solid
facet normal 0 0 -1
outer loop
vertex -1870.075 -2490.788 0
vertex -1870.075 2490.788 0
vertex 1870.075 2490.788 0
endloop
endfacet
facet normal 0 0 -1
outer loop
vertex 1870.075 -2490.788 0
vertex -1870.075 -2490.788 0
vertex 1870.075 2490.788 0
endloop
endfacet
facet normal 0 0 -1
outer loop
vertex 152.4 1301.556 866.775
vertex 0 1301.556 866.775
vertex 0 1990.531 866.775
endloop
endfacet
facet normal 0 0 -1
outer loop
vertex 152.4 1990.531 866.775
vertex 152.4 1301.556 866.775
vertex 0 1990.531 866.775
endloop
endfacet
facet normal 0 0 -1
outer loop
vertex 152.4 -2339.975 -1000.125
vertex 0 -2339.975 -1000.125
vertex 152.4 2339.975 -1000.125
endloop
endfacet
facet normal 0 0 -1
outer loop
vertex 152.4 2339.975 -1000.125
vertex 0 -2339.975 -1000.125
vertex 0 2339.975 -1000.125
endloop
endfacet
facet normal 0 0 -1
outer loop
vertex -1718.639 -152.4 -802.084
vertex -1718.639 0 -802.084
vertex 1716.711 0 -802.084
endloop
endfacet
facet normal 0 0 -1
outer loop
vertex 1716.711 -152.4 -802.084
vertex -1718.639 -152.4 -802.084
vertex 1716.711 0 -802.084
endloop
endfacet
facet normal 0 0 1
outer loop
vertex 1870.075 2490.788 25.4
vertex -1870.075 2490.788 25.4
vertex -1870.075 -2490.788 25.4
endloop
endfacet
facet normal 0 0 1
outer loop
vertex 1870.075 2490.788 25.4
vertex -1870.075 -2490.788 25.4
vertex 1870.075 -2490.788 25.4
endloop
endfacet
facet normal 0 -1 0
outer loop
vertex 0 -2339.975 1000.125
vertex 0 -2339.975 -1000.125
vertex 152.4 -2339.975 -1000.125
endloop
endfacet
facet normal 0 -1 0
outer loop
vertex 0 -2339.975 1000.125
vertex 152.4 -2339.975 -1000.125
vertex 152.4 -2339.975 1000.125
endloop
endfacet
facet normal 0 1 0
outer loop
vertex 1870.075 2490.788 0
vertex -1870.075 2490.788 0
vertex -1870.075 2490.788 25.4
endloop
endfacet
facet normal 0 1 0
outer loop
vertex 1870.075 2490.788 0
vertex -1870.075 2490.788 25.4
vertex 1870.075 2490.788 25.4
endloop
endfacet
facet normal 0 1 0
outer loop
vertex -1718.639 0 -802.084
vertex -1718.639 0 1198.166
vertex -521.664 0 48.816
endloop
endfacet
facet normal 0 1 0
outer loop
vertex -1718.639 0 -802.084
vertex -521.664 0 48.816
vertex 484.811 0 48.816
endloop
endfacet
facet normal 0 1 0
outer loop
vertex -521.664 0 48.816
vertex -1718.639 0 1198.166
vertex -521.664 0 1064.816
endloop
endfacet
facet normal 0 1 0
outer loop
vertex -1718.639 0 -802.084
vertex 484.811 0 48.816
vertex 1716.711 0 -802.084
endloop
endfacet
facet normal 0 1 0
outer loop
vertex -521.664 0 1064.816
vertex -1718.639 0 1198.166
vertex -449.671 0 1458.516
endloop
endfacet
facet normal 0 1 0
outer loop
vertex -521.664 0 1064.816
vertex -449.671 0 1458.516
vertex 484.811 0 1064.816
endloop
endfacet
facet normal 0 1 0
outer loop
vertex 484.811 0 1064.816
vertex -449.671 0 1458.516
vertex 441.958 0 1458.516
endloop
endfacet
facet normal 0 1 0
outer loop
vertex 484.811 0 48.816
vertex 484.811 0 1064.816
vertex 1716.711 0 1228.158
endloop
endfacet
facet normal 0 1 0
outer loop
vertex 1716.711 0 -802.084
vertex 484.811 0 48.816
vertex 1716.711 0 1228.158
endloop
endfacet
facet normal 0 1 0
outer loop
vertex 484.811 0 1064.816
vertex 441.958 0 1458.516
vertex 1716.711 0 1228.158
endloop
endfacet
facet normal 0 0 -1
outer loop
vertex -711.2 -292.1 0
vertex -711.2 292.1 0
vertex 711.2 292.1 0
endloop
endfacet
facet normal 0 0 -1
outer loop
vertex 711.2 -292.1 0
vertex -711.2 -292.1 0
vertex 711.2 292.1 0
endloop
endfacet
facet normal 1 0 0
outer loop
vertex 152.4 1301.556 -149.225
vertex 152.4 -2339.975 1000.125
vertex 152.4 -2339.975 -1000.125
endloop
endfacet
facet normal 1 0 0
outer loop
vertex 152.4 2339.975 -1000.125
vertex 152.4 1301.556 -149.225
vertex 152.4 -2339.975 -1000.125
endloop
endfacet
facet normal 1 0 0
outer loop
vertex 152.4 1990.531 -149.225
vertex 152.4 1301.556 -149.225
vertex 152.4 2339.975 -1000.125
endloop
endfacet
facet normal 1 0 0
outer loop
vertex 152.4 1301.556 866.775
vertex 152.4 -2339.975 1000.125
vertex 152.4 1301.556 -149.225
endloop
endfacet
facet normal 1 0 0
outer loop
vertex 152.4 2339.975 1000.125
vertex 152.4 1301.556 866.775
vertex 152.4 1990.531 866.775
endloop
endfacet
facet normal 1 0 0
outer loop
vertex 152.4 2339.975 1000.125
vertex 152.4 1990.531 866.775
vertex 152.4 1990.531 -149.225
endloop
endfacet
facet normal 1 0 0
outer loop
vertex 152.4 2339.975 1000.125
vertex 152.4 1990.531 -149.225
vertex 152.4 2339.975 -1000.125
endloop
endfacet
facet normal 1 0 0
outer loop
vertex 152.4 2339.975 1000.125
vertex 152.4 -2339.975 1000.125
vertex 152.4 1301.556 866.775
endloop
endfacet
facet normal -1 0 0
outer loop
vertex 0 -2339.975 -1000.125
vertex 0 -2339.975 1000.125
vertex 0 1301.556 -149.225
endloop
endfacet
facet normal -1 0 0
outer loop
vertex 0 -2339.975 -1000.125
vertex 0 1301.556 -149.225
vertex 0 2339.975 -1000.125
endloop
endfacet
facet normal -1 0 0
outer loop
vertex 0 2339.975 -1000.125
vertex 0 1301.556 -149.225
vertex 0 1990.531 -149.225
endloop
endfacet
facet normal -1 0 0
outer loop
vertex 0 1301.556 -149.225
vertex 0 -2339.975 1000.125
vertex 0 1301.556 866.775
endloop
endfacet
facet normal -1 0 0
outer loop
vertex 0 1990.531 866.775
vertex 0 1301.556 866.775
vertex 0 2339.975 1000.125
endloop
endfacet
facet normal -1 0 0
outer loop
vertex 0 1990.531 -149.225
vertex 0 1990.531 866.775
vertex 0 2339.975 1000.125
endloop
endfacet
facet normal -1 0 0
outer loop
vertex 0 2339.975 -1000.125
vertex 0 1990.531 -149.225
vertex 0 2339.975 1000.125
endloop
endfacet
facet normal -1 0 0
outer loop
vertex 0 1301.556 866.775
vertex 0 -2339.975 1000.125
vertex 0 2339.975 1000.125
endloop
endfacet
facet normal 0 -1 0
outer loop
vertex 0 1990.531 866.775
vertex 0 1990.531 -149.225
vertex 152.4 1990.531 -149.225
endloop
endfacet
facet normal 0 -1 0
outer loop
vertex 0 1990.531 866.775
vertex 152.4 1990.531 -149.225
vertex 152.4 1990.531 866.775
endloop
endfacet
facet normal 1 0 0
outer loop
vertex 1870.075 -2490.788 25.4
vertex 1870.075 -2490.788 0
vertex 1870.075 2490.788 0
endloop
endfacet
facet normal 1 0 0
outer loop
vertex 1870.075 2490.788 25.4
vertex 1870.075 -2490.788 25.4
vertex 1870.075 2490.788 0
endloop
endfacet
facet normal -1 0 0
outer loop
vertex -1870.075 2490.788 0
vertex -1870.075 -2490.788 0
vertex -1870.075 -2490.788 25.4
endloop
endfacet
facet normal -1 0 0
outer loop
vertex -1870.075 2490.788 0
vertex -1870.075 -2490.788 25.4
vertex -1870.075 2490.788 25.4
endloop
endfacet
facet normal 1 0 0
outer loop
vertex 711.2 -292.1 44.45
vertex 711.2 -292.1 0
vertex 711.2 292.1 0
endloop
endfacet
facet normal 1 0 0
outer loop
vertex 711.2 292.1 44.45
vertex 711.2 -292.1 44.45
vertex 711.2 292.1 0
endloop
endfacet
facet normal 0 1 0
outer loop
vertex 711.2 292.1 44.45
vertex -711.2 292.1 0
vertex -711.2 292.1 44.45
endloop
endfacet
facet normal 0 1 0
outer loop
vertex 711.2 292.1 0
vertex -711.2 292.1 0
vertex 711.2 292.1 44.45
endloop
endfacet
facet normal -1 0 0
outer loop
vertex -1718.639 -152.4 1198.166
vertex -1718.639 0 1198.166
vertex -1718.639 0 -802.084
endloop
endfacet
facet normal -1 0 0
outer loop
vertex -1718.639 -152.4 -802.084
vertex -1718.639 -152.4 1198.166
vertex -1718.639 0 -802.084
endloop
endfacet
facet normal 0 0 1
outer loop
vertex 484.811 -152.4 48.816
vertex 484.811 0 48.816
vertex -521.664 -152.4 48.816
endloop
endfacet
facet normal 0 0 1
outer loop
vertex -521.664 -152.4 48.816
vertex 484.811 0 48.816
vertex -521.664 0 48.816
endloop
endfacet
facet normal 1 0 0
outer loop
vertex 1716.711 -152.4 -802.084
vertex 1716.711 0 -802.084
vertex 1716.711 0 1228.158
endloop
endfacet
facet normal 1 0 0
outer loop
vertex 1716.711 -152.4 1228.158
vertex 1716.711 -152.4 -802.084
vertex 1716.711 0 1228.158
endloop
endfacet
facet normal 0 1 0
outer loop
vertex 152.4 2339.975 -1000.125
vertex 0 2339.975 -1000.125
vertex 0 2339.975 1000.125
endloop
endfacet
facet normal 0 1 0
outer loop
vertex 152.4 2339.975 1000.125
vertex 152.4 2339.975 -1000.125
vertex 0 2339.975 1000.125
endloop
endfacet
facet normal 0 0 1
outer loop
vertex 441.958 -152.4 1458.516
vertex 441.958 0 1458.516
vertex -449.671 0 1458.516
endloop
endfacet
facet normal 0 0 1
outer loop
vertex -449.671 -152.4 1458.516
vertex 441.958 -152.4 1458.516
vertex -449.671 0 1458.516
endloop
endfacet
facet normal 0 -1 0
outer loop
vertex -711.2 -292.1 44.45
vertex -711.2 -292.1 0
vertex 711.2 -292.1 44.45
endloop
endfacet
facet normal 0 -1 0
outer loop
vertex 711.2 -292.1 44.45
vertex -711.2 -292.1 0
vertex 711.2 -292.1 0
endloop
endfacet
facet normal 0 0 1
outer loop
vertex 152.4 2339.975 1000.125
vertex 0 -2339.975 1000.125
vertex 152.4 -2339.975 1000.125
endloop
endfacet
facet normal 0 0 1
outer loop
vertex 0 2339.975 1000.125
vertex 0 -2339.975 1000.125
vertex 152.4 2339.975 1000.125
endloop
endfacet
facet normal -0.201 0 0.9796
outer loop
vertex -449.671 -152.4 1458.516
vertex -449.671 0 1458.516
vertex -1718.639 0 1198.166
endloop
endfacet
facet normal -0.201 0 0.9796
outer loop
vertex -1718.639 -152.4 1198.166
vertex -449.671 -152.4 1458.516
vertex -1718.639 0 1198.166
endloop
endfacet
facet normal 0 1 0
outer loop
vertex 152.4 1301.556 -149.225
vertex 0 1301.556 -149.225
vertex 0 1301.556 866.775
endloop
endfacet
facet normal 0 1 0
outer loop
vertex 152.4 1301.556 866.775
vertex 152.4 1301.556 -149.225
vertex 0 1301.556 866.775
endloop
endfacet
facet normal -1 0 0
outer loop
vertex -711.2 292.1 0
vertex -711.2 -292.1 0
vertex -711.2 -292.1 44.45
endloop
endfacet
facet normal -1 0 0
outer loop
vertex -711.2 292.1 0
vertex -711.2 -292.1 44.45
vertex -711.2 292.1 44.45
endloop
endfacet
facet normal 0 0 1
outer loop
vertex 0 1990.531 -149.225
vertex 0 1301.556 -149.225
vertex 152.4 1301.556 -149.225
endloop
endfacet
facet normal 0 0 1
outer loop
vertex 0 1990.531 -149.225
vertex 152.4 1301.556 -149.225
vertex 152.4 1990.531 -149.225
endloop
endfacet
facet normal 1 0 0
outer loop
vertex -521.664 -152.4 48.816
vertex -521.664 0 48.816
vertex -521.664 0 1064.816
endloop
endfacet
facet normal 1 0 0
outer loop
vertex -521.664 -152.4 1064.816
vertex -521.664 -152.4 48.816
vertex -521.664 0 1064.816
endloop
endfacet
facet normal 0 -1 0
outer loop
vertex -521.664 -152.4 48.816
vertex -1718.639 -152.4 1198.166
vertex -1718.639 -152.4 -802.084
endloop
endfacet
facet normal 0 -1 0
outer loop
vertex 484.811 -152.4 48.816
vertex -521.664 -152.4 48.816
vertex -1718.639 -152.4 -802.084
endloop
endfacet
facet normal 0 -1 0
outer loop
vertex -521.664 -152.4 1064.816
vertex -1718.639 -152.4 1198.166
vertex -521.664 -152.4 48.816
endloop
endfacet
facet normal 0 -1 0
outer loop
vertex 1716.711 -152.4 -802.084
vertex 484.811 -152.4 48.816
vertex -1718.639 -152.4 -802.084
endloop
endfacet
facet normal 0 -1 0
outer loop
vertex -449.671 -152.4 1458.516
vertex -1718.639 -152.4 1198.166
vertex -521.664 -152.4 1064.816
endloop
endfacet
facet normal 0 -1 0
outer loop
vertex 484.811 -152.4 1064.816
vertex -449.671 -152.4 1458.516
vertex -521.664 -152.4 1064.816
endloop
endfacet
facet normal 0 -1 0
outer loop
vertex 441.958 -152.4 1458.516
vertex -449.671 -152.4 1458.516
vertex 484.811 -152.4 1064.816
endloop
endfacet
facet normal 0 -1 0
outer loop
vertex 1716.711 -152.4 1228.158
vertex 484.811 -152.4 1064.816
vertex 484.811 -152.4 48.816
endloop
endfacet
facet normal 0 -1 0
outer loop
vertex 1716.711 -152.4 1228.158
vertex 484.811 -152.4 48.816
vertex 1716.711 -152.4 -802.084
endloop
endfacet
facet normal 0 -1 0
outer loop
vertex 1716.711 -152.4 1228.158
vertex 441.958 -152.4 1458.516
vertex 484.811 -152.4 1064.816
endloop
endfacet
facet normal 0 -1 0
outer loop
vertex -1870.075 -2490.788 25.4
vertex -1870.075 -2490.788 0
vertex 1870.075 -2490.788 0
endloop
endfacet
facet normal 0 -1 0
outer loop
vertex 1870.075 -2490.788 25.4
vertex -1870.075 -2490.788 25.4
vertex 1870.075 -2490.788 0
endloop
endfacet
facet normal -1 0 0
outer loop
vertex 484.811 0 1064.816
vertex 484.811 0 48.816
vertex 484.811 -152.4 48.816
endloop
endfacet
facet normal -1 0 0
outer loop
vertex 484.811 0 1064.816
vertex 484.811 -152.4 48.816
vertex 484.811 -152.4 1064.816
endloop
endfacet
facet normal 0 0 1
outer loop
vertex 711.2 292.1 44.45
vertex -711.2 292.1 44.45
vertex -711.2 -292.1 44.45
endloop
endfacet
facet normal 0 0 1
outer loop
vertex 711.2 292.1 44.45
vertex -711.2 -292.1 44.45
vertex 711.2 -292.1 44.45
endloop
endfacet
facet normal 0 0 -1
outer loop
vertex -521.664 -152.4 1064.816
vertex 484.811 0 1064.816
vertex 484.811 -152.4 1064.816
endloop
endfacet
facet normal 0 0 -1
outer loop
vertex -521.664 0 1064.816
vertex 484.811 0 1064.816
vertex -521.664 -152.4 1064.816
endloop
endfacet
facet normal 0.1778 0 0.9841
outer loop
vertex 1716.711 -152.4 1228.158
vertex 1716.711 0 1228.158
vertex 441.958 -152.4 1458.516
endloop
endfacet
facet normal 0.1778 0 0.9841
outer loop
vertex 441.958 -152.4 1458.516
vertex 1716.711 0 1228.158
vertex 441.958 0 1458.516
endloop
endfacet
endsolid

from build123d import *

# Parameters (mm, degrees)
F0_W     = 3740.15
F0_H     = 4981.575
F1_DEPTH = 25.4
F2_W     = 4679.95
F2_H     = 2000.25
F2_W_2   = 688.975
F2_H_2   = 1016
F3_DEPTH = 152.4
F5_DEPTH = 152.4
F6_W     = 1006.475
F6_H     = 1016
F7_DEPTH = 152.4
F8_W     = 1422.4
F8_H     = 584.2
F9_DEPTH = 44.45


# Not quite as in the source:
# - a feature names something its author has since deleted; it is built from what else it names


with BuildPart() as f1:
    # F0 (on Top) → F1 (new body)
    with BuildSketch(Plane.XY):
        Rectangle(F0_W, F0_H)
    extrude(amount=F1_DEPTH)


with BuildPart() as f3:
    # F2 (on Right) → F3 (new body)
    with BuildSketch(Plane.YZ):
        Rectangle(F2_W, F2_H)
        with Locations((1646.0432527542, 358.775)):
            Rectangle(F2_W_2, F2_H_2, mode=Mode.SUBTRACT)
    extrude(amount=F3_DEPTH)


with BuildPart() as f5:
    # F4 (on Front) → F5 (new body)
    with BuildSketch(Plane.XZ):
        Polygon((-1718.6389747441, -802.0838088955), (1716.7110252559, -802.0838088955), (1716.7110252559, 1228.1581670422), (441.9575821344, 1458.5161911045), (-449.6712692842, 1458.5161911045), (-1718.6389747441, 1198.1661911045), align=None)
    extrude(amount=F5_DEPTH)

    # F6 (on face) → F7 (cut)
    with BuildSketch(Plane(origin=(0, 0, 0), x_dir=(-1, 0, 0), z_dir=(0, 1, 0))):
        with Locations((18.4264747441, 556.8161911045)):
            Rectangle(F6_W, F6_H)
    extrude(amount=-F7_DEPTH, mode=Mode.SUBTRACT)


with BuildPart() as f9:
    # F8 (on Top) → F9 (new body)
    with BuildSketch(Plane.XY):
        Rectangle(F8_W, F8_H)
    extrude(amount=F9_DEPTH)


solid = Compound([f1.part, f3.part, f5.part, f9.part])
